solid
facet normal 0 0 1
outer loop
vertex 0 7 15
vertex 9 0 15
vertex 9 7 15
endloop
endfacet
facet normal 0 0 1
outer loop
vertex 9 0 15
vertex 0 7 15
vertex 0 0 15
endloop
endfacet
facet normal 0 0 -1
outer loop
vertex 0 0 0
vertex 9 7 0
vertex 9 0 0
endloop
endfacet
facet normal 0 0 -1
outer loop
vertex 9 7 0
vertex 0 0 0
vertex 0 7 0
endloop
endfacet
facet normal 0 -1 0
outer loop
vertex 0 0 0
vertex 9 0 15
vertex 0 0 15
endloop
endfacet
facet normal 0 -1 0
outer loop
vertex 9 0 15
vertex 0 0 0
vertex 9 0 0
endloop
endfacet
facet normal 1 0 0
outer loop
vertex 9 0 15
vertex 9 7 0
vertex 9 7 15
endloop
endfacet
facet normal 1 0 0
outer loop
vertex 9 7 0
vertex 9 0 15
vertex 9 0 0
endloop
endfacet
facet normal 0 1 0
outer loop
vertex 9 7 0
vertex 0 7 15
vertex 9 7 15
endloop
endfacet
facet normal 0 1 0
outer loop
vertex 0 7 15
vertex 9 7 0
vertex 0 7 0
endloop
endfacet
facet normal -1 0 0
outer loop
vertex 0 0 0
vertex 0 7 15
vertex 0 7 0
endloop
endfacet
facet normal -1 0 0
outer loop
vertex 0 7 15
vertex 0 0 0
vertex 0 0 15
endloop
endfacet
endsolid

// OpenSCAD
// Generated by SolidPython 1.0.1 on 2020-07-29 00:46:55


cube(size = [9, 7, 15]);
/***********************************************
*********      SolidPython code:      **********
************************************************
 
# import packages: SolidPython
from solid import *
from solid.utils import *
from itertools import chain, combinations, permutations


class Resize:

    def __init__(self, scad_file):
        self.scad_file = scad_file
        #self.scad_file = import_scad(scad_file)
        # cone/cylinder param:
        self.r1 = 0
        self.r2 = 0
        self.h = 0
        # rectangular prism param:
        self.w = 0
        self.l = 0
        # ellipse param:
        self.r = 0

    # import OpenScad code (file name corresponds to shape)


    # classify shape + parameters
    def assign(self, param1, param2, param3):
        if self.scad_file == 'cone.scad':
            self.r1 = param1
            self.r2 = param2
            self.h = param3
        elif self.scad_file == 'cylinder.scad':
            self.r1 = param1
            self.r2 = param2
            self.h = param3
        elif self.scad_file == 'rectangularPrism.scad':
            self.h = param1
            self.l = param2
            self.w = param3
        else:
            self.r = param1
            self.h = param2

    # resize parameters
    def iterate(self):
        x = range(3, 20, 2)
        i = 1
        if self.scad_file == 'cone.scad':
            tempList = list(permutations(x, 2))
            for temp in tempList:
                param1 = temp[0]
                param2 = temp[1]
                filepath = 'produced_scad_files/' + 'cone' + str(param1) + '_' + str(param2) + '_' + '.scad'
                scad_render_to_file(cylinder(h=param1, r1=param2, r2=0), filepath)

        elif self.scad_file == 'cylinder.scad':
            tempList = list(permutations(x, 3))
            for temp in tempList:
                param1 = temp[0]
                param2 = temp[1]
                filepath = 'produced_scad_files/' + 'cylinder' + str(param1) + '_' + str(param2) + '_' + '.scad'
                scad_render_to_file(cylinder(h=param1, r1=param2, r2=param2), filepath)

        elif self.scad_file == 'rectangularPrism.scad':
            tempList = list(permutations(x, 3))
            for temp in tempList:
                param1 = temp[0]
                param2 = temp[1]
                param3 = temp[2]
                filepath = 'produced_scad_files/' + 'rectangularPrism' + str(param1) + '_' + str(param2) + '_' + str(
                    param3) + '.scad'
                scad_render_to_file(cube(size=(param1, param2, param3)), filepath)

        elif self.scad_file == 'ellipse.scad':
            tempList = list(permutations(x, 4))
            for temp in tempList:
                param1 = temp[0]
                param2 = temp[1]
                param3 = temp[2]
                param4 = temp[3]
                filepath = 'produced_scad_files/' + 'ellipse' + str(param1) + '_' + str(param2) + '_' + str(param3) + '_' + str(param4) + '.scad'
                scad_render_to_file(scale([param1, param2, param3])(sphere(r=param4)), filepath)

    def render_to_scadfile(self):
        scad_render_to_file(scad, 'example.scad') 
 
************************************************/
